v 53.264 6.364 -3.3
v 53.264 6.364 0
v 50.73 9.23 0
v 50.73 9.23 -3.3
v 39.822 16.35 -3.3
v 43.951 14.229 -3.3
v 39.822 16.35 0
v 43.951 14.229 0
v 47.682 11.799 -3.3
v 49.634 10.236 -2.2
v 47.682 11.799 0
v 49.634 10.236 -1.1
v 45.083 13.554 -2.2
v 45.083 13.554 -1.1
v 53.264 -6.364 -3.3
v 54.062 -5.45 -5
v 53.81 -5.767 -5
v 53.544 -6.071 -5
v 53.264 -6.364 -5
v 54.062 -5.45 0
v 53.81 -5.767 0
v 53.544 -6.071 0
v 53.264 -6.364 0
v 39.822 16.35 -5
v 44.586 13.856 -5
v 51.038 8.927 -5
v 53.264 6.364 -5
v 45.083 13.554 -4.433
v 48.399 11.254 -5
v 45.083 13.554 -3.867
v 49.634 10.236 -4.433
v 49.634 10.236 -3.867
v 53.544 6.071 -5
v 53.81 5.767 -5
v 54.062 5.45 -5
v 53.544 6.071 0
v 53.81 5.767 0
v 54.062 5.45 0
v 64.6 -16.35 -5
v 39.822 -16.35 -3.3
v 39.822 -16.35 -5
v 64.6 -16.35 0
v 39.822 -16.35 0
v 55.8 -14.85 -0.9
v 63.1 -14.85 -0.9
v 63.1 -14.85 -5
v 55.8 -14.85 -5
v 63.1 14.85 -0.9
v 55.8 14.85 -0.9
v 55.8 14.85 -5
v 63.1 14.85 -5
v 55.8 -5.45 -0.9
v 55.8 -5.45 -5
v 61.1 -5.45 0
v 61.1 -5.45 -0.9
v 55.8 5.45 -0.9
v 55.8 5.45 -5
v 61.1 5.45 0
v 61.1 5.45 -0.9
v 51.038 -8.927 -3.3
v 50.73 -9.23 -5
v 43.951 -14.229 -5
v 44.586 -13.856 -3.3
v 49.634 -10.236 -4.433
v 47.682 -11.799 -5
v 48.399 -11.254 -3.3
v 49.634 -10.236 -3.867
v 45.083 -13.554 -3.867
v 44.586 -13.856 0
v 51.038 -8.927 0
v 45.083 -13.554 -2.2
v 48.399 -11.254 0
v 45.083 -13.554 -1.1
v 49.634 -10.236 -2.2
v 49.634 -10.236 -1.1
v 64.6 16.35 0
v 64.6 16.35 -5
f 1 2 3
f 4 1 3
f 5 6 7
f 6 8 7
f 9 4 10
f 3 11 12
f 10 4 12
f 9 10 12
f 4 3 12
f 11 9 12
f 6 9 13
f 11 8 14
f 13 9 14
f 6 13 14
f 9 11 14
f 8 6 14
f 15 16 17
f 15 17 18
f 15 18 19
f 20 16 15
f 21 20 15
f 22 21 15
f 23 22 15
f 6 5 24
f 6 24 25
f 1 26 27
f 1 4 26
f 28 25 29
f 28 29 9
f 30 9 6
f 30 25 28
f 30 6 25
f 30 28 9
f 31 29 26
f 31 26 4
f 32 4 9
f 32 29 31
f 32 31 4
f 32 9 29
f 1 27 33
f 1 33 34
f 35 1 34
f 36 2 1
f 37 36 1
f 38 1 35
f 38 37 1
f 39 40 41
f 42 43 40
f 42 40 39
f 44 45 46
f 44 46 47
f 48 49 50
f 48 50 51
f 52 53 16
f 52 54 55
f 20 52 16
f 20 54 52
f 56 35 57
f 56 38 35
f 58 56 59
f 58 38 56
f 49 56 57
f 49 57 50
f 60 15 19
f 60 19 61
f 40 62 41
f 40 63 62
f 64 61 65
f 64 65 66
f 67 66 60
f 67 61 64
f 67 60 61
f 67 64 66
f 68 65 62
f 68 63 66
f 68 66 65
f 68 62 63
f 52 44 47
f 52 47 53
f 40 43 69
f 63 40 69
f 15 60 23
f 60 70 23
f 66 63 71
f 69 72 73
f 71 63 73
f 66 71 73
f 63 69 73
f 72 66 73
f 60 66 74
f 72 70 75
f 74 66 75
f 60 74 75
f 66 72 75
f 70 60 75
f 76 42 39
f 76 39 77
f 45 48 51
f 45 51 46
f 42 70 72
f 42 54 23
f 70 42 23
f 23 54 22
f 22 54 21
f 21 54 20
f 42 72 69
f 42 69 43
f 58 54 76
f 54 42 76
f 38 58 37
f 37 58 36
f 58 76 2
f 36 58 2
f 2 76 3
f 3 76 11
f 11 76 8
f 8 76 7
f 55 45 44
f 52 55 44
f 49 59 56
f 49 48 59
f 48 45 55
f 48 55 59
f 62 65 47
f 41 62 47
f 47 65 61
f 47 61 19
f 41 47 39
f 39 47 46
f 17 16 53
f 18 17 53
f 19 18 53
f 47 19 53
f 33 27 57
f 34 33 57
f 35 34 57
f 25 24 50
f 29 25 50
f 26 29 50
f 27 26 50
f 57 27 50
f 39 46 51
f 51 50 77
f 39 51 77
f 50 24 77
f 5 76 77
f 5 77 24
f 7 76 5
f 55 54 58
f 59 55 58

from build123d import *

# Parameters (mm, degrees)
BOSS_EXTRUDE1_DEPTH = 3.3
SKETCH2_W           = 2
SKETCH2_H           = 10.9
BOSS_EXTRUDE2_DEPTH = 0.9
BOSS_EXTRUDE3_DEPTH = 1.7


with BuildPart() as part:
    # Sketch1 → Boss-Extrude1 (new body)
    with BuildSketch(Plane.XY):
        with BuildLine():
            add(Edge.make_bspline(
                [(53.263961031, 6.363961031), (50.163311673, 10.524172065), (45.36862919, 13.803956999), (39.822404925, 16.35)],
                knots=[0, 0, 0, 0, 0.272957657, 0.272957657, 0.272957657, 0.272957657], degree=3))
            ThreePointArc((53.263961031, 6.363961031), (53.678515614, 5.92044982), (54.062227307, 5.45))
            Line((54.062227307, 5.45), (55.8, 5.45))
            Line((55.8, 5.45), (55.8, 14.85))
            Line((55.8, 14.85), (63.1, 14.85))
            Line((63.1, 14.85), (63.1, -14.85))
            Line((63.1, -14.85), (55.8, -14.85))
            Line((55.8, -14.85), (55.8, -5.45))
            Line((55.8, -5.45), (54.062227307, -5.45))
            ThreePointArc((54.062227307, -5.45), (53.678515614, -5.92044982), (53.263961031, -6.363961031))
            add(Edge.make_bspline(
                [(39.822404925, -16.35), (45.36862919, -13.803956999), (50.163311673, -10.524172065), (53.263961031, -6.363961031)],
                knots=[0.727042343, 0.727042343, 0.727042343, 0.727042343, 1, 1, 1, 1], degree=3))
            Line((39.822404925, -16.35), (64.6, -16.35))
            Line((64.6, -16.35), (64.6, 16.35))
            Line((64.6, 16.35), (39.822404925, 16.35))
        make_face()
    extrude(amount=-BOSS_EXTRUDE1_DEPTH)

    # Sketch2 → Boss-Extrude2 (add)
    with BuildSketch(Plane(origin=(0, 0, 0), x_dir=(-1, 0, 0), z_dir=(0, 0, -1))):
        Polygon((-61.1, -5.45), (-63.1, -5.45), (-63.1, -14.85), (-55.8, -14.85), (-55.8, -5.45), align=None)
        Polygon((-55.8, 5.45), (-55.8, 14.85), (-63.1, 14.85), (-63.1, 5.45), (-61.1, 5.45), align=None)
        with Locations((-62.1, 0)):
            Rectangle(SKETCH2_W, SKETCH2_H)
    extrude(amount=BOSS_EXTRUDE2_DEPTH)

    # Sketch3 → Boss-Extrude3 (add)
    with BuildSketch(Plane.XY.offset(-3.3)):
        with BuildLine():
            Line((54.062227307, 5.45), (55.8, 5.45))
            Line((55.8, 5.45), (55.8, 14.85))
            Line((55.8, 14.85), (63.1, 14.85))
            Line((63.1, 14.85), (63.1, -14.85))
            Line((63.1, -14.85), (55.8, -14.85))
            Line((55.8, -14.85), (55.8, -5.45))
            Line((55.8, -5.45), (54.062227307, -5.45))
            ThreePointArc((54.062227307, -5.45), (53.678515614, -5.92044982), (53.263961031, -6.363961031))
            add(Edge.make_bspline(
                [(53.263961031, -6.363961031), (50.163311673, -10.524172065), (45.36862919, -13.803956999), (39.822404925, -16.35)],
                knots=[0.727042343, 0.727042343, 0.727042343, 0.727042343, 1, 1, 1, 1], degree=3))
            Line((39.822404925, -16.35), (64.6, -16.35))
            Line((64.6, -16.35), (64.6, -15.05))
            Line((64.6, -15.05), (64.6, 15.05))
            Line((64.6, 15.05), (64.6, 16.35))
            Line((64.6, 16.35), (39.822404925, 16.35))
            add(Edge.make_bspline(
                [(39.822404925, 16.35), (45.36862919, 13.803956999), (50.163311673, 10.524172065), (53.263961031, 6.363961031)],
                knots=[0, 0, 0, 0, 0.272957657, 0.272957657, 0.272957657, 0.272957657], degree=3))
            ThreePointArc((53.263961031, 6.363961031), (53.678515614, 5.92044982), (54.062227307, 5.45))
        make_face()
    extrude(amount=-BOSS_EXTRUDE3_DEPTH)


solid = part.part
